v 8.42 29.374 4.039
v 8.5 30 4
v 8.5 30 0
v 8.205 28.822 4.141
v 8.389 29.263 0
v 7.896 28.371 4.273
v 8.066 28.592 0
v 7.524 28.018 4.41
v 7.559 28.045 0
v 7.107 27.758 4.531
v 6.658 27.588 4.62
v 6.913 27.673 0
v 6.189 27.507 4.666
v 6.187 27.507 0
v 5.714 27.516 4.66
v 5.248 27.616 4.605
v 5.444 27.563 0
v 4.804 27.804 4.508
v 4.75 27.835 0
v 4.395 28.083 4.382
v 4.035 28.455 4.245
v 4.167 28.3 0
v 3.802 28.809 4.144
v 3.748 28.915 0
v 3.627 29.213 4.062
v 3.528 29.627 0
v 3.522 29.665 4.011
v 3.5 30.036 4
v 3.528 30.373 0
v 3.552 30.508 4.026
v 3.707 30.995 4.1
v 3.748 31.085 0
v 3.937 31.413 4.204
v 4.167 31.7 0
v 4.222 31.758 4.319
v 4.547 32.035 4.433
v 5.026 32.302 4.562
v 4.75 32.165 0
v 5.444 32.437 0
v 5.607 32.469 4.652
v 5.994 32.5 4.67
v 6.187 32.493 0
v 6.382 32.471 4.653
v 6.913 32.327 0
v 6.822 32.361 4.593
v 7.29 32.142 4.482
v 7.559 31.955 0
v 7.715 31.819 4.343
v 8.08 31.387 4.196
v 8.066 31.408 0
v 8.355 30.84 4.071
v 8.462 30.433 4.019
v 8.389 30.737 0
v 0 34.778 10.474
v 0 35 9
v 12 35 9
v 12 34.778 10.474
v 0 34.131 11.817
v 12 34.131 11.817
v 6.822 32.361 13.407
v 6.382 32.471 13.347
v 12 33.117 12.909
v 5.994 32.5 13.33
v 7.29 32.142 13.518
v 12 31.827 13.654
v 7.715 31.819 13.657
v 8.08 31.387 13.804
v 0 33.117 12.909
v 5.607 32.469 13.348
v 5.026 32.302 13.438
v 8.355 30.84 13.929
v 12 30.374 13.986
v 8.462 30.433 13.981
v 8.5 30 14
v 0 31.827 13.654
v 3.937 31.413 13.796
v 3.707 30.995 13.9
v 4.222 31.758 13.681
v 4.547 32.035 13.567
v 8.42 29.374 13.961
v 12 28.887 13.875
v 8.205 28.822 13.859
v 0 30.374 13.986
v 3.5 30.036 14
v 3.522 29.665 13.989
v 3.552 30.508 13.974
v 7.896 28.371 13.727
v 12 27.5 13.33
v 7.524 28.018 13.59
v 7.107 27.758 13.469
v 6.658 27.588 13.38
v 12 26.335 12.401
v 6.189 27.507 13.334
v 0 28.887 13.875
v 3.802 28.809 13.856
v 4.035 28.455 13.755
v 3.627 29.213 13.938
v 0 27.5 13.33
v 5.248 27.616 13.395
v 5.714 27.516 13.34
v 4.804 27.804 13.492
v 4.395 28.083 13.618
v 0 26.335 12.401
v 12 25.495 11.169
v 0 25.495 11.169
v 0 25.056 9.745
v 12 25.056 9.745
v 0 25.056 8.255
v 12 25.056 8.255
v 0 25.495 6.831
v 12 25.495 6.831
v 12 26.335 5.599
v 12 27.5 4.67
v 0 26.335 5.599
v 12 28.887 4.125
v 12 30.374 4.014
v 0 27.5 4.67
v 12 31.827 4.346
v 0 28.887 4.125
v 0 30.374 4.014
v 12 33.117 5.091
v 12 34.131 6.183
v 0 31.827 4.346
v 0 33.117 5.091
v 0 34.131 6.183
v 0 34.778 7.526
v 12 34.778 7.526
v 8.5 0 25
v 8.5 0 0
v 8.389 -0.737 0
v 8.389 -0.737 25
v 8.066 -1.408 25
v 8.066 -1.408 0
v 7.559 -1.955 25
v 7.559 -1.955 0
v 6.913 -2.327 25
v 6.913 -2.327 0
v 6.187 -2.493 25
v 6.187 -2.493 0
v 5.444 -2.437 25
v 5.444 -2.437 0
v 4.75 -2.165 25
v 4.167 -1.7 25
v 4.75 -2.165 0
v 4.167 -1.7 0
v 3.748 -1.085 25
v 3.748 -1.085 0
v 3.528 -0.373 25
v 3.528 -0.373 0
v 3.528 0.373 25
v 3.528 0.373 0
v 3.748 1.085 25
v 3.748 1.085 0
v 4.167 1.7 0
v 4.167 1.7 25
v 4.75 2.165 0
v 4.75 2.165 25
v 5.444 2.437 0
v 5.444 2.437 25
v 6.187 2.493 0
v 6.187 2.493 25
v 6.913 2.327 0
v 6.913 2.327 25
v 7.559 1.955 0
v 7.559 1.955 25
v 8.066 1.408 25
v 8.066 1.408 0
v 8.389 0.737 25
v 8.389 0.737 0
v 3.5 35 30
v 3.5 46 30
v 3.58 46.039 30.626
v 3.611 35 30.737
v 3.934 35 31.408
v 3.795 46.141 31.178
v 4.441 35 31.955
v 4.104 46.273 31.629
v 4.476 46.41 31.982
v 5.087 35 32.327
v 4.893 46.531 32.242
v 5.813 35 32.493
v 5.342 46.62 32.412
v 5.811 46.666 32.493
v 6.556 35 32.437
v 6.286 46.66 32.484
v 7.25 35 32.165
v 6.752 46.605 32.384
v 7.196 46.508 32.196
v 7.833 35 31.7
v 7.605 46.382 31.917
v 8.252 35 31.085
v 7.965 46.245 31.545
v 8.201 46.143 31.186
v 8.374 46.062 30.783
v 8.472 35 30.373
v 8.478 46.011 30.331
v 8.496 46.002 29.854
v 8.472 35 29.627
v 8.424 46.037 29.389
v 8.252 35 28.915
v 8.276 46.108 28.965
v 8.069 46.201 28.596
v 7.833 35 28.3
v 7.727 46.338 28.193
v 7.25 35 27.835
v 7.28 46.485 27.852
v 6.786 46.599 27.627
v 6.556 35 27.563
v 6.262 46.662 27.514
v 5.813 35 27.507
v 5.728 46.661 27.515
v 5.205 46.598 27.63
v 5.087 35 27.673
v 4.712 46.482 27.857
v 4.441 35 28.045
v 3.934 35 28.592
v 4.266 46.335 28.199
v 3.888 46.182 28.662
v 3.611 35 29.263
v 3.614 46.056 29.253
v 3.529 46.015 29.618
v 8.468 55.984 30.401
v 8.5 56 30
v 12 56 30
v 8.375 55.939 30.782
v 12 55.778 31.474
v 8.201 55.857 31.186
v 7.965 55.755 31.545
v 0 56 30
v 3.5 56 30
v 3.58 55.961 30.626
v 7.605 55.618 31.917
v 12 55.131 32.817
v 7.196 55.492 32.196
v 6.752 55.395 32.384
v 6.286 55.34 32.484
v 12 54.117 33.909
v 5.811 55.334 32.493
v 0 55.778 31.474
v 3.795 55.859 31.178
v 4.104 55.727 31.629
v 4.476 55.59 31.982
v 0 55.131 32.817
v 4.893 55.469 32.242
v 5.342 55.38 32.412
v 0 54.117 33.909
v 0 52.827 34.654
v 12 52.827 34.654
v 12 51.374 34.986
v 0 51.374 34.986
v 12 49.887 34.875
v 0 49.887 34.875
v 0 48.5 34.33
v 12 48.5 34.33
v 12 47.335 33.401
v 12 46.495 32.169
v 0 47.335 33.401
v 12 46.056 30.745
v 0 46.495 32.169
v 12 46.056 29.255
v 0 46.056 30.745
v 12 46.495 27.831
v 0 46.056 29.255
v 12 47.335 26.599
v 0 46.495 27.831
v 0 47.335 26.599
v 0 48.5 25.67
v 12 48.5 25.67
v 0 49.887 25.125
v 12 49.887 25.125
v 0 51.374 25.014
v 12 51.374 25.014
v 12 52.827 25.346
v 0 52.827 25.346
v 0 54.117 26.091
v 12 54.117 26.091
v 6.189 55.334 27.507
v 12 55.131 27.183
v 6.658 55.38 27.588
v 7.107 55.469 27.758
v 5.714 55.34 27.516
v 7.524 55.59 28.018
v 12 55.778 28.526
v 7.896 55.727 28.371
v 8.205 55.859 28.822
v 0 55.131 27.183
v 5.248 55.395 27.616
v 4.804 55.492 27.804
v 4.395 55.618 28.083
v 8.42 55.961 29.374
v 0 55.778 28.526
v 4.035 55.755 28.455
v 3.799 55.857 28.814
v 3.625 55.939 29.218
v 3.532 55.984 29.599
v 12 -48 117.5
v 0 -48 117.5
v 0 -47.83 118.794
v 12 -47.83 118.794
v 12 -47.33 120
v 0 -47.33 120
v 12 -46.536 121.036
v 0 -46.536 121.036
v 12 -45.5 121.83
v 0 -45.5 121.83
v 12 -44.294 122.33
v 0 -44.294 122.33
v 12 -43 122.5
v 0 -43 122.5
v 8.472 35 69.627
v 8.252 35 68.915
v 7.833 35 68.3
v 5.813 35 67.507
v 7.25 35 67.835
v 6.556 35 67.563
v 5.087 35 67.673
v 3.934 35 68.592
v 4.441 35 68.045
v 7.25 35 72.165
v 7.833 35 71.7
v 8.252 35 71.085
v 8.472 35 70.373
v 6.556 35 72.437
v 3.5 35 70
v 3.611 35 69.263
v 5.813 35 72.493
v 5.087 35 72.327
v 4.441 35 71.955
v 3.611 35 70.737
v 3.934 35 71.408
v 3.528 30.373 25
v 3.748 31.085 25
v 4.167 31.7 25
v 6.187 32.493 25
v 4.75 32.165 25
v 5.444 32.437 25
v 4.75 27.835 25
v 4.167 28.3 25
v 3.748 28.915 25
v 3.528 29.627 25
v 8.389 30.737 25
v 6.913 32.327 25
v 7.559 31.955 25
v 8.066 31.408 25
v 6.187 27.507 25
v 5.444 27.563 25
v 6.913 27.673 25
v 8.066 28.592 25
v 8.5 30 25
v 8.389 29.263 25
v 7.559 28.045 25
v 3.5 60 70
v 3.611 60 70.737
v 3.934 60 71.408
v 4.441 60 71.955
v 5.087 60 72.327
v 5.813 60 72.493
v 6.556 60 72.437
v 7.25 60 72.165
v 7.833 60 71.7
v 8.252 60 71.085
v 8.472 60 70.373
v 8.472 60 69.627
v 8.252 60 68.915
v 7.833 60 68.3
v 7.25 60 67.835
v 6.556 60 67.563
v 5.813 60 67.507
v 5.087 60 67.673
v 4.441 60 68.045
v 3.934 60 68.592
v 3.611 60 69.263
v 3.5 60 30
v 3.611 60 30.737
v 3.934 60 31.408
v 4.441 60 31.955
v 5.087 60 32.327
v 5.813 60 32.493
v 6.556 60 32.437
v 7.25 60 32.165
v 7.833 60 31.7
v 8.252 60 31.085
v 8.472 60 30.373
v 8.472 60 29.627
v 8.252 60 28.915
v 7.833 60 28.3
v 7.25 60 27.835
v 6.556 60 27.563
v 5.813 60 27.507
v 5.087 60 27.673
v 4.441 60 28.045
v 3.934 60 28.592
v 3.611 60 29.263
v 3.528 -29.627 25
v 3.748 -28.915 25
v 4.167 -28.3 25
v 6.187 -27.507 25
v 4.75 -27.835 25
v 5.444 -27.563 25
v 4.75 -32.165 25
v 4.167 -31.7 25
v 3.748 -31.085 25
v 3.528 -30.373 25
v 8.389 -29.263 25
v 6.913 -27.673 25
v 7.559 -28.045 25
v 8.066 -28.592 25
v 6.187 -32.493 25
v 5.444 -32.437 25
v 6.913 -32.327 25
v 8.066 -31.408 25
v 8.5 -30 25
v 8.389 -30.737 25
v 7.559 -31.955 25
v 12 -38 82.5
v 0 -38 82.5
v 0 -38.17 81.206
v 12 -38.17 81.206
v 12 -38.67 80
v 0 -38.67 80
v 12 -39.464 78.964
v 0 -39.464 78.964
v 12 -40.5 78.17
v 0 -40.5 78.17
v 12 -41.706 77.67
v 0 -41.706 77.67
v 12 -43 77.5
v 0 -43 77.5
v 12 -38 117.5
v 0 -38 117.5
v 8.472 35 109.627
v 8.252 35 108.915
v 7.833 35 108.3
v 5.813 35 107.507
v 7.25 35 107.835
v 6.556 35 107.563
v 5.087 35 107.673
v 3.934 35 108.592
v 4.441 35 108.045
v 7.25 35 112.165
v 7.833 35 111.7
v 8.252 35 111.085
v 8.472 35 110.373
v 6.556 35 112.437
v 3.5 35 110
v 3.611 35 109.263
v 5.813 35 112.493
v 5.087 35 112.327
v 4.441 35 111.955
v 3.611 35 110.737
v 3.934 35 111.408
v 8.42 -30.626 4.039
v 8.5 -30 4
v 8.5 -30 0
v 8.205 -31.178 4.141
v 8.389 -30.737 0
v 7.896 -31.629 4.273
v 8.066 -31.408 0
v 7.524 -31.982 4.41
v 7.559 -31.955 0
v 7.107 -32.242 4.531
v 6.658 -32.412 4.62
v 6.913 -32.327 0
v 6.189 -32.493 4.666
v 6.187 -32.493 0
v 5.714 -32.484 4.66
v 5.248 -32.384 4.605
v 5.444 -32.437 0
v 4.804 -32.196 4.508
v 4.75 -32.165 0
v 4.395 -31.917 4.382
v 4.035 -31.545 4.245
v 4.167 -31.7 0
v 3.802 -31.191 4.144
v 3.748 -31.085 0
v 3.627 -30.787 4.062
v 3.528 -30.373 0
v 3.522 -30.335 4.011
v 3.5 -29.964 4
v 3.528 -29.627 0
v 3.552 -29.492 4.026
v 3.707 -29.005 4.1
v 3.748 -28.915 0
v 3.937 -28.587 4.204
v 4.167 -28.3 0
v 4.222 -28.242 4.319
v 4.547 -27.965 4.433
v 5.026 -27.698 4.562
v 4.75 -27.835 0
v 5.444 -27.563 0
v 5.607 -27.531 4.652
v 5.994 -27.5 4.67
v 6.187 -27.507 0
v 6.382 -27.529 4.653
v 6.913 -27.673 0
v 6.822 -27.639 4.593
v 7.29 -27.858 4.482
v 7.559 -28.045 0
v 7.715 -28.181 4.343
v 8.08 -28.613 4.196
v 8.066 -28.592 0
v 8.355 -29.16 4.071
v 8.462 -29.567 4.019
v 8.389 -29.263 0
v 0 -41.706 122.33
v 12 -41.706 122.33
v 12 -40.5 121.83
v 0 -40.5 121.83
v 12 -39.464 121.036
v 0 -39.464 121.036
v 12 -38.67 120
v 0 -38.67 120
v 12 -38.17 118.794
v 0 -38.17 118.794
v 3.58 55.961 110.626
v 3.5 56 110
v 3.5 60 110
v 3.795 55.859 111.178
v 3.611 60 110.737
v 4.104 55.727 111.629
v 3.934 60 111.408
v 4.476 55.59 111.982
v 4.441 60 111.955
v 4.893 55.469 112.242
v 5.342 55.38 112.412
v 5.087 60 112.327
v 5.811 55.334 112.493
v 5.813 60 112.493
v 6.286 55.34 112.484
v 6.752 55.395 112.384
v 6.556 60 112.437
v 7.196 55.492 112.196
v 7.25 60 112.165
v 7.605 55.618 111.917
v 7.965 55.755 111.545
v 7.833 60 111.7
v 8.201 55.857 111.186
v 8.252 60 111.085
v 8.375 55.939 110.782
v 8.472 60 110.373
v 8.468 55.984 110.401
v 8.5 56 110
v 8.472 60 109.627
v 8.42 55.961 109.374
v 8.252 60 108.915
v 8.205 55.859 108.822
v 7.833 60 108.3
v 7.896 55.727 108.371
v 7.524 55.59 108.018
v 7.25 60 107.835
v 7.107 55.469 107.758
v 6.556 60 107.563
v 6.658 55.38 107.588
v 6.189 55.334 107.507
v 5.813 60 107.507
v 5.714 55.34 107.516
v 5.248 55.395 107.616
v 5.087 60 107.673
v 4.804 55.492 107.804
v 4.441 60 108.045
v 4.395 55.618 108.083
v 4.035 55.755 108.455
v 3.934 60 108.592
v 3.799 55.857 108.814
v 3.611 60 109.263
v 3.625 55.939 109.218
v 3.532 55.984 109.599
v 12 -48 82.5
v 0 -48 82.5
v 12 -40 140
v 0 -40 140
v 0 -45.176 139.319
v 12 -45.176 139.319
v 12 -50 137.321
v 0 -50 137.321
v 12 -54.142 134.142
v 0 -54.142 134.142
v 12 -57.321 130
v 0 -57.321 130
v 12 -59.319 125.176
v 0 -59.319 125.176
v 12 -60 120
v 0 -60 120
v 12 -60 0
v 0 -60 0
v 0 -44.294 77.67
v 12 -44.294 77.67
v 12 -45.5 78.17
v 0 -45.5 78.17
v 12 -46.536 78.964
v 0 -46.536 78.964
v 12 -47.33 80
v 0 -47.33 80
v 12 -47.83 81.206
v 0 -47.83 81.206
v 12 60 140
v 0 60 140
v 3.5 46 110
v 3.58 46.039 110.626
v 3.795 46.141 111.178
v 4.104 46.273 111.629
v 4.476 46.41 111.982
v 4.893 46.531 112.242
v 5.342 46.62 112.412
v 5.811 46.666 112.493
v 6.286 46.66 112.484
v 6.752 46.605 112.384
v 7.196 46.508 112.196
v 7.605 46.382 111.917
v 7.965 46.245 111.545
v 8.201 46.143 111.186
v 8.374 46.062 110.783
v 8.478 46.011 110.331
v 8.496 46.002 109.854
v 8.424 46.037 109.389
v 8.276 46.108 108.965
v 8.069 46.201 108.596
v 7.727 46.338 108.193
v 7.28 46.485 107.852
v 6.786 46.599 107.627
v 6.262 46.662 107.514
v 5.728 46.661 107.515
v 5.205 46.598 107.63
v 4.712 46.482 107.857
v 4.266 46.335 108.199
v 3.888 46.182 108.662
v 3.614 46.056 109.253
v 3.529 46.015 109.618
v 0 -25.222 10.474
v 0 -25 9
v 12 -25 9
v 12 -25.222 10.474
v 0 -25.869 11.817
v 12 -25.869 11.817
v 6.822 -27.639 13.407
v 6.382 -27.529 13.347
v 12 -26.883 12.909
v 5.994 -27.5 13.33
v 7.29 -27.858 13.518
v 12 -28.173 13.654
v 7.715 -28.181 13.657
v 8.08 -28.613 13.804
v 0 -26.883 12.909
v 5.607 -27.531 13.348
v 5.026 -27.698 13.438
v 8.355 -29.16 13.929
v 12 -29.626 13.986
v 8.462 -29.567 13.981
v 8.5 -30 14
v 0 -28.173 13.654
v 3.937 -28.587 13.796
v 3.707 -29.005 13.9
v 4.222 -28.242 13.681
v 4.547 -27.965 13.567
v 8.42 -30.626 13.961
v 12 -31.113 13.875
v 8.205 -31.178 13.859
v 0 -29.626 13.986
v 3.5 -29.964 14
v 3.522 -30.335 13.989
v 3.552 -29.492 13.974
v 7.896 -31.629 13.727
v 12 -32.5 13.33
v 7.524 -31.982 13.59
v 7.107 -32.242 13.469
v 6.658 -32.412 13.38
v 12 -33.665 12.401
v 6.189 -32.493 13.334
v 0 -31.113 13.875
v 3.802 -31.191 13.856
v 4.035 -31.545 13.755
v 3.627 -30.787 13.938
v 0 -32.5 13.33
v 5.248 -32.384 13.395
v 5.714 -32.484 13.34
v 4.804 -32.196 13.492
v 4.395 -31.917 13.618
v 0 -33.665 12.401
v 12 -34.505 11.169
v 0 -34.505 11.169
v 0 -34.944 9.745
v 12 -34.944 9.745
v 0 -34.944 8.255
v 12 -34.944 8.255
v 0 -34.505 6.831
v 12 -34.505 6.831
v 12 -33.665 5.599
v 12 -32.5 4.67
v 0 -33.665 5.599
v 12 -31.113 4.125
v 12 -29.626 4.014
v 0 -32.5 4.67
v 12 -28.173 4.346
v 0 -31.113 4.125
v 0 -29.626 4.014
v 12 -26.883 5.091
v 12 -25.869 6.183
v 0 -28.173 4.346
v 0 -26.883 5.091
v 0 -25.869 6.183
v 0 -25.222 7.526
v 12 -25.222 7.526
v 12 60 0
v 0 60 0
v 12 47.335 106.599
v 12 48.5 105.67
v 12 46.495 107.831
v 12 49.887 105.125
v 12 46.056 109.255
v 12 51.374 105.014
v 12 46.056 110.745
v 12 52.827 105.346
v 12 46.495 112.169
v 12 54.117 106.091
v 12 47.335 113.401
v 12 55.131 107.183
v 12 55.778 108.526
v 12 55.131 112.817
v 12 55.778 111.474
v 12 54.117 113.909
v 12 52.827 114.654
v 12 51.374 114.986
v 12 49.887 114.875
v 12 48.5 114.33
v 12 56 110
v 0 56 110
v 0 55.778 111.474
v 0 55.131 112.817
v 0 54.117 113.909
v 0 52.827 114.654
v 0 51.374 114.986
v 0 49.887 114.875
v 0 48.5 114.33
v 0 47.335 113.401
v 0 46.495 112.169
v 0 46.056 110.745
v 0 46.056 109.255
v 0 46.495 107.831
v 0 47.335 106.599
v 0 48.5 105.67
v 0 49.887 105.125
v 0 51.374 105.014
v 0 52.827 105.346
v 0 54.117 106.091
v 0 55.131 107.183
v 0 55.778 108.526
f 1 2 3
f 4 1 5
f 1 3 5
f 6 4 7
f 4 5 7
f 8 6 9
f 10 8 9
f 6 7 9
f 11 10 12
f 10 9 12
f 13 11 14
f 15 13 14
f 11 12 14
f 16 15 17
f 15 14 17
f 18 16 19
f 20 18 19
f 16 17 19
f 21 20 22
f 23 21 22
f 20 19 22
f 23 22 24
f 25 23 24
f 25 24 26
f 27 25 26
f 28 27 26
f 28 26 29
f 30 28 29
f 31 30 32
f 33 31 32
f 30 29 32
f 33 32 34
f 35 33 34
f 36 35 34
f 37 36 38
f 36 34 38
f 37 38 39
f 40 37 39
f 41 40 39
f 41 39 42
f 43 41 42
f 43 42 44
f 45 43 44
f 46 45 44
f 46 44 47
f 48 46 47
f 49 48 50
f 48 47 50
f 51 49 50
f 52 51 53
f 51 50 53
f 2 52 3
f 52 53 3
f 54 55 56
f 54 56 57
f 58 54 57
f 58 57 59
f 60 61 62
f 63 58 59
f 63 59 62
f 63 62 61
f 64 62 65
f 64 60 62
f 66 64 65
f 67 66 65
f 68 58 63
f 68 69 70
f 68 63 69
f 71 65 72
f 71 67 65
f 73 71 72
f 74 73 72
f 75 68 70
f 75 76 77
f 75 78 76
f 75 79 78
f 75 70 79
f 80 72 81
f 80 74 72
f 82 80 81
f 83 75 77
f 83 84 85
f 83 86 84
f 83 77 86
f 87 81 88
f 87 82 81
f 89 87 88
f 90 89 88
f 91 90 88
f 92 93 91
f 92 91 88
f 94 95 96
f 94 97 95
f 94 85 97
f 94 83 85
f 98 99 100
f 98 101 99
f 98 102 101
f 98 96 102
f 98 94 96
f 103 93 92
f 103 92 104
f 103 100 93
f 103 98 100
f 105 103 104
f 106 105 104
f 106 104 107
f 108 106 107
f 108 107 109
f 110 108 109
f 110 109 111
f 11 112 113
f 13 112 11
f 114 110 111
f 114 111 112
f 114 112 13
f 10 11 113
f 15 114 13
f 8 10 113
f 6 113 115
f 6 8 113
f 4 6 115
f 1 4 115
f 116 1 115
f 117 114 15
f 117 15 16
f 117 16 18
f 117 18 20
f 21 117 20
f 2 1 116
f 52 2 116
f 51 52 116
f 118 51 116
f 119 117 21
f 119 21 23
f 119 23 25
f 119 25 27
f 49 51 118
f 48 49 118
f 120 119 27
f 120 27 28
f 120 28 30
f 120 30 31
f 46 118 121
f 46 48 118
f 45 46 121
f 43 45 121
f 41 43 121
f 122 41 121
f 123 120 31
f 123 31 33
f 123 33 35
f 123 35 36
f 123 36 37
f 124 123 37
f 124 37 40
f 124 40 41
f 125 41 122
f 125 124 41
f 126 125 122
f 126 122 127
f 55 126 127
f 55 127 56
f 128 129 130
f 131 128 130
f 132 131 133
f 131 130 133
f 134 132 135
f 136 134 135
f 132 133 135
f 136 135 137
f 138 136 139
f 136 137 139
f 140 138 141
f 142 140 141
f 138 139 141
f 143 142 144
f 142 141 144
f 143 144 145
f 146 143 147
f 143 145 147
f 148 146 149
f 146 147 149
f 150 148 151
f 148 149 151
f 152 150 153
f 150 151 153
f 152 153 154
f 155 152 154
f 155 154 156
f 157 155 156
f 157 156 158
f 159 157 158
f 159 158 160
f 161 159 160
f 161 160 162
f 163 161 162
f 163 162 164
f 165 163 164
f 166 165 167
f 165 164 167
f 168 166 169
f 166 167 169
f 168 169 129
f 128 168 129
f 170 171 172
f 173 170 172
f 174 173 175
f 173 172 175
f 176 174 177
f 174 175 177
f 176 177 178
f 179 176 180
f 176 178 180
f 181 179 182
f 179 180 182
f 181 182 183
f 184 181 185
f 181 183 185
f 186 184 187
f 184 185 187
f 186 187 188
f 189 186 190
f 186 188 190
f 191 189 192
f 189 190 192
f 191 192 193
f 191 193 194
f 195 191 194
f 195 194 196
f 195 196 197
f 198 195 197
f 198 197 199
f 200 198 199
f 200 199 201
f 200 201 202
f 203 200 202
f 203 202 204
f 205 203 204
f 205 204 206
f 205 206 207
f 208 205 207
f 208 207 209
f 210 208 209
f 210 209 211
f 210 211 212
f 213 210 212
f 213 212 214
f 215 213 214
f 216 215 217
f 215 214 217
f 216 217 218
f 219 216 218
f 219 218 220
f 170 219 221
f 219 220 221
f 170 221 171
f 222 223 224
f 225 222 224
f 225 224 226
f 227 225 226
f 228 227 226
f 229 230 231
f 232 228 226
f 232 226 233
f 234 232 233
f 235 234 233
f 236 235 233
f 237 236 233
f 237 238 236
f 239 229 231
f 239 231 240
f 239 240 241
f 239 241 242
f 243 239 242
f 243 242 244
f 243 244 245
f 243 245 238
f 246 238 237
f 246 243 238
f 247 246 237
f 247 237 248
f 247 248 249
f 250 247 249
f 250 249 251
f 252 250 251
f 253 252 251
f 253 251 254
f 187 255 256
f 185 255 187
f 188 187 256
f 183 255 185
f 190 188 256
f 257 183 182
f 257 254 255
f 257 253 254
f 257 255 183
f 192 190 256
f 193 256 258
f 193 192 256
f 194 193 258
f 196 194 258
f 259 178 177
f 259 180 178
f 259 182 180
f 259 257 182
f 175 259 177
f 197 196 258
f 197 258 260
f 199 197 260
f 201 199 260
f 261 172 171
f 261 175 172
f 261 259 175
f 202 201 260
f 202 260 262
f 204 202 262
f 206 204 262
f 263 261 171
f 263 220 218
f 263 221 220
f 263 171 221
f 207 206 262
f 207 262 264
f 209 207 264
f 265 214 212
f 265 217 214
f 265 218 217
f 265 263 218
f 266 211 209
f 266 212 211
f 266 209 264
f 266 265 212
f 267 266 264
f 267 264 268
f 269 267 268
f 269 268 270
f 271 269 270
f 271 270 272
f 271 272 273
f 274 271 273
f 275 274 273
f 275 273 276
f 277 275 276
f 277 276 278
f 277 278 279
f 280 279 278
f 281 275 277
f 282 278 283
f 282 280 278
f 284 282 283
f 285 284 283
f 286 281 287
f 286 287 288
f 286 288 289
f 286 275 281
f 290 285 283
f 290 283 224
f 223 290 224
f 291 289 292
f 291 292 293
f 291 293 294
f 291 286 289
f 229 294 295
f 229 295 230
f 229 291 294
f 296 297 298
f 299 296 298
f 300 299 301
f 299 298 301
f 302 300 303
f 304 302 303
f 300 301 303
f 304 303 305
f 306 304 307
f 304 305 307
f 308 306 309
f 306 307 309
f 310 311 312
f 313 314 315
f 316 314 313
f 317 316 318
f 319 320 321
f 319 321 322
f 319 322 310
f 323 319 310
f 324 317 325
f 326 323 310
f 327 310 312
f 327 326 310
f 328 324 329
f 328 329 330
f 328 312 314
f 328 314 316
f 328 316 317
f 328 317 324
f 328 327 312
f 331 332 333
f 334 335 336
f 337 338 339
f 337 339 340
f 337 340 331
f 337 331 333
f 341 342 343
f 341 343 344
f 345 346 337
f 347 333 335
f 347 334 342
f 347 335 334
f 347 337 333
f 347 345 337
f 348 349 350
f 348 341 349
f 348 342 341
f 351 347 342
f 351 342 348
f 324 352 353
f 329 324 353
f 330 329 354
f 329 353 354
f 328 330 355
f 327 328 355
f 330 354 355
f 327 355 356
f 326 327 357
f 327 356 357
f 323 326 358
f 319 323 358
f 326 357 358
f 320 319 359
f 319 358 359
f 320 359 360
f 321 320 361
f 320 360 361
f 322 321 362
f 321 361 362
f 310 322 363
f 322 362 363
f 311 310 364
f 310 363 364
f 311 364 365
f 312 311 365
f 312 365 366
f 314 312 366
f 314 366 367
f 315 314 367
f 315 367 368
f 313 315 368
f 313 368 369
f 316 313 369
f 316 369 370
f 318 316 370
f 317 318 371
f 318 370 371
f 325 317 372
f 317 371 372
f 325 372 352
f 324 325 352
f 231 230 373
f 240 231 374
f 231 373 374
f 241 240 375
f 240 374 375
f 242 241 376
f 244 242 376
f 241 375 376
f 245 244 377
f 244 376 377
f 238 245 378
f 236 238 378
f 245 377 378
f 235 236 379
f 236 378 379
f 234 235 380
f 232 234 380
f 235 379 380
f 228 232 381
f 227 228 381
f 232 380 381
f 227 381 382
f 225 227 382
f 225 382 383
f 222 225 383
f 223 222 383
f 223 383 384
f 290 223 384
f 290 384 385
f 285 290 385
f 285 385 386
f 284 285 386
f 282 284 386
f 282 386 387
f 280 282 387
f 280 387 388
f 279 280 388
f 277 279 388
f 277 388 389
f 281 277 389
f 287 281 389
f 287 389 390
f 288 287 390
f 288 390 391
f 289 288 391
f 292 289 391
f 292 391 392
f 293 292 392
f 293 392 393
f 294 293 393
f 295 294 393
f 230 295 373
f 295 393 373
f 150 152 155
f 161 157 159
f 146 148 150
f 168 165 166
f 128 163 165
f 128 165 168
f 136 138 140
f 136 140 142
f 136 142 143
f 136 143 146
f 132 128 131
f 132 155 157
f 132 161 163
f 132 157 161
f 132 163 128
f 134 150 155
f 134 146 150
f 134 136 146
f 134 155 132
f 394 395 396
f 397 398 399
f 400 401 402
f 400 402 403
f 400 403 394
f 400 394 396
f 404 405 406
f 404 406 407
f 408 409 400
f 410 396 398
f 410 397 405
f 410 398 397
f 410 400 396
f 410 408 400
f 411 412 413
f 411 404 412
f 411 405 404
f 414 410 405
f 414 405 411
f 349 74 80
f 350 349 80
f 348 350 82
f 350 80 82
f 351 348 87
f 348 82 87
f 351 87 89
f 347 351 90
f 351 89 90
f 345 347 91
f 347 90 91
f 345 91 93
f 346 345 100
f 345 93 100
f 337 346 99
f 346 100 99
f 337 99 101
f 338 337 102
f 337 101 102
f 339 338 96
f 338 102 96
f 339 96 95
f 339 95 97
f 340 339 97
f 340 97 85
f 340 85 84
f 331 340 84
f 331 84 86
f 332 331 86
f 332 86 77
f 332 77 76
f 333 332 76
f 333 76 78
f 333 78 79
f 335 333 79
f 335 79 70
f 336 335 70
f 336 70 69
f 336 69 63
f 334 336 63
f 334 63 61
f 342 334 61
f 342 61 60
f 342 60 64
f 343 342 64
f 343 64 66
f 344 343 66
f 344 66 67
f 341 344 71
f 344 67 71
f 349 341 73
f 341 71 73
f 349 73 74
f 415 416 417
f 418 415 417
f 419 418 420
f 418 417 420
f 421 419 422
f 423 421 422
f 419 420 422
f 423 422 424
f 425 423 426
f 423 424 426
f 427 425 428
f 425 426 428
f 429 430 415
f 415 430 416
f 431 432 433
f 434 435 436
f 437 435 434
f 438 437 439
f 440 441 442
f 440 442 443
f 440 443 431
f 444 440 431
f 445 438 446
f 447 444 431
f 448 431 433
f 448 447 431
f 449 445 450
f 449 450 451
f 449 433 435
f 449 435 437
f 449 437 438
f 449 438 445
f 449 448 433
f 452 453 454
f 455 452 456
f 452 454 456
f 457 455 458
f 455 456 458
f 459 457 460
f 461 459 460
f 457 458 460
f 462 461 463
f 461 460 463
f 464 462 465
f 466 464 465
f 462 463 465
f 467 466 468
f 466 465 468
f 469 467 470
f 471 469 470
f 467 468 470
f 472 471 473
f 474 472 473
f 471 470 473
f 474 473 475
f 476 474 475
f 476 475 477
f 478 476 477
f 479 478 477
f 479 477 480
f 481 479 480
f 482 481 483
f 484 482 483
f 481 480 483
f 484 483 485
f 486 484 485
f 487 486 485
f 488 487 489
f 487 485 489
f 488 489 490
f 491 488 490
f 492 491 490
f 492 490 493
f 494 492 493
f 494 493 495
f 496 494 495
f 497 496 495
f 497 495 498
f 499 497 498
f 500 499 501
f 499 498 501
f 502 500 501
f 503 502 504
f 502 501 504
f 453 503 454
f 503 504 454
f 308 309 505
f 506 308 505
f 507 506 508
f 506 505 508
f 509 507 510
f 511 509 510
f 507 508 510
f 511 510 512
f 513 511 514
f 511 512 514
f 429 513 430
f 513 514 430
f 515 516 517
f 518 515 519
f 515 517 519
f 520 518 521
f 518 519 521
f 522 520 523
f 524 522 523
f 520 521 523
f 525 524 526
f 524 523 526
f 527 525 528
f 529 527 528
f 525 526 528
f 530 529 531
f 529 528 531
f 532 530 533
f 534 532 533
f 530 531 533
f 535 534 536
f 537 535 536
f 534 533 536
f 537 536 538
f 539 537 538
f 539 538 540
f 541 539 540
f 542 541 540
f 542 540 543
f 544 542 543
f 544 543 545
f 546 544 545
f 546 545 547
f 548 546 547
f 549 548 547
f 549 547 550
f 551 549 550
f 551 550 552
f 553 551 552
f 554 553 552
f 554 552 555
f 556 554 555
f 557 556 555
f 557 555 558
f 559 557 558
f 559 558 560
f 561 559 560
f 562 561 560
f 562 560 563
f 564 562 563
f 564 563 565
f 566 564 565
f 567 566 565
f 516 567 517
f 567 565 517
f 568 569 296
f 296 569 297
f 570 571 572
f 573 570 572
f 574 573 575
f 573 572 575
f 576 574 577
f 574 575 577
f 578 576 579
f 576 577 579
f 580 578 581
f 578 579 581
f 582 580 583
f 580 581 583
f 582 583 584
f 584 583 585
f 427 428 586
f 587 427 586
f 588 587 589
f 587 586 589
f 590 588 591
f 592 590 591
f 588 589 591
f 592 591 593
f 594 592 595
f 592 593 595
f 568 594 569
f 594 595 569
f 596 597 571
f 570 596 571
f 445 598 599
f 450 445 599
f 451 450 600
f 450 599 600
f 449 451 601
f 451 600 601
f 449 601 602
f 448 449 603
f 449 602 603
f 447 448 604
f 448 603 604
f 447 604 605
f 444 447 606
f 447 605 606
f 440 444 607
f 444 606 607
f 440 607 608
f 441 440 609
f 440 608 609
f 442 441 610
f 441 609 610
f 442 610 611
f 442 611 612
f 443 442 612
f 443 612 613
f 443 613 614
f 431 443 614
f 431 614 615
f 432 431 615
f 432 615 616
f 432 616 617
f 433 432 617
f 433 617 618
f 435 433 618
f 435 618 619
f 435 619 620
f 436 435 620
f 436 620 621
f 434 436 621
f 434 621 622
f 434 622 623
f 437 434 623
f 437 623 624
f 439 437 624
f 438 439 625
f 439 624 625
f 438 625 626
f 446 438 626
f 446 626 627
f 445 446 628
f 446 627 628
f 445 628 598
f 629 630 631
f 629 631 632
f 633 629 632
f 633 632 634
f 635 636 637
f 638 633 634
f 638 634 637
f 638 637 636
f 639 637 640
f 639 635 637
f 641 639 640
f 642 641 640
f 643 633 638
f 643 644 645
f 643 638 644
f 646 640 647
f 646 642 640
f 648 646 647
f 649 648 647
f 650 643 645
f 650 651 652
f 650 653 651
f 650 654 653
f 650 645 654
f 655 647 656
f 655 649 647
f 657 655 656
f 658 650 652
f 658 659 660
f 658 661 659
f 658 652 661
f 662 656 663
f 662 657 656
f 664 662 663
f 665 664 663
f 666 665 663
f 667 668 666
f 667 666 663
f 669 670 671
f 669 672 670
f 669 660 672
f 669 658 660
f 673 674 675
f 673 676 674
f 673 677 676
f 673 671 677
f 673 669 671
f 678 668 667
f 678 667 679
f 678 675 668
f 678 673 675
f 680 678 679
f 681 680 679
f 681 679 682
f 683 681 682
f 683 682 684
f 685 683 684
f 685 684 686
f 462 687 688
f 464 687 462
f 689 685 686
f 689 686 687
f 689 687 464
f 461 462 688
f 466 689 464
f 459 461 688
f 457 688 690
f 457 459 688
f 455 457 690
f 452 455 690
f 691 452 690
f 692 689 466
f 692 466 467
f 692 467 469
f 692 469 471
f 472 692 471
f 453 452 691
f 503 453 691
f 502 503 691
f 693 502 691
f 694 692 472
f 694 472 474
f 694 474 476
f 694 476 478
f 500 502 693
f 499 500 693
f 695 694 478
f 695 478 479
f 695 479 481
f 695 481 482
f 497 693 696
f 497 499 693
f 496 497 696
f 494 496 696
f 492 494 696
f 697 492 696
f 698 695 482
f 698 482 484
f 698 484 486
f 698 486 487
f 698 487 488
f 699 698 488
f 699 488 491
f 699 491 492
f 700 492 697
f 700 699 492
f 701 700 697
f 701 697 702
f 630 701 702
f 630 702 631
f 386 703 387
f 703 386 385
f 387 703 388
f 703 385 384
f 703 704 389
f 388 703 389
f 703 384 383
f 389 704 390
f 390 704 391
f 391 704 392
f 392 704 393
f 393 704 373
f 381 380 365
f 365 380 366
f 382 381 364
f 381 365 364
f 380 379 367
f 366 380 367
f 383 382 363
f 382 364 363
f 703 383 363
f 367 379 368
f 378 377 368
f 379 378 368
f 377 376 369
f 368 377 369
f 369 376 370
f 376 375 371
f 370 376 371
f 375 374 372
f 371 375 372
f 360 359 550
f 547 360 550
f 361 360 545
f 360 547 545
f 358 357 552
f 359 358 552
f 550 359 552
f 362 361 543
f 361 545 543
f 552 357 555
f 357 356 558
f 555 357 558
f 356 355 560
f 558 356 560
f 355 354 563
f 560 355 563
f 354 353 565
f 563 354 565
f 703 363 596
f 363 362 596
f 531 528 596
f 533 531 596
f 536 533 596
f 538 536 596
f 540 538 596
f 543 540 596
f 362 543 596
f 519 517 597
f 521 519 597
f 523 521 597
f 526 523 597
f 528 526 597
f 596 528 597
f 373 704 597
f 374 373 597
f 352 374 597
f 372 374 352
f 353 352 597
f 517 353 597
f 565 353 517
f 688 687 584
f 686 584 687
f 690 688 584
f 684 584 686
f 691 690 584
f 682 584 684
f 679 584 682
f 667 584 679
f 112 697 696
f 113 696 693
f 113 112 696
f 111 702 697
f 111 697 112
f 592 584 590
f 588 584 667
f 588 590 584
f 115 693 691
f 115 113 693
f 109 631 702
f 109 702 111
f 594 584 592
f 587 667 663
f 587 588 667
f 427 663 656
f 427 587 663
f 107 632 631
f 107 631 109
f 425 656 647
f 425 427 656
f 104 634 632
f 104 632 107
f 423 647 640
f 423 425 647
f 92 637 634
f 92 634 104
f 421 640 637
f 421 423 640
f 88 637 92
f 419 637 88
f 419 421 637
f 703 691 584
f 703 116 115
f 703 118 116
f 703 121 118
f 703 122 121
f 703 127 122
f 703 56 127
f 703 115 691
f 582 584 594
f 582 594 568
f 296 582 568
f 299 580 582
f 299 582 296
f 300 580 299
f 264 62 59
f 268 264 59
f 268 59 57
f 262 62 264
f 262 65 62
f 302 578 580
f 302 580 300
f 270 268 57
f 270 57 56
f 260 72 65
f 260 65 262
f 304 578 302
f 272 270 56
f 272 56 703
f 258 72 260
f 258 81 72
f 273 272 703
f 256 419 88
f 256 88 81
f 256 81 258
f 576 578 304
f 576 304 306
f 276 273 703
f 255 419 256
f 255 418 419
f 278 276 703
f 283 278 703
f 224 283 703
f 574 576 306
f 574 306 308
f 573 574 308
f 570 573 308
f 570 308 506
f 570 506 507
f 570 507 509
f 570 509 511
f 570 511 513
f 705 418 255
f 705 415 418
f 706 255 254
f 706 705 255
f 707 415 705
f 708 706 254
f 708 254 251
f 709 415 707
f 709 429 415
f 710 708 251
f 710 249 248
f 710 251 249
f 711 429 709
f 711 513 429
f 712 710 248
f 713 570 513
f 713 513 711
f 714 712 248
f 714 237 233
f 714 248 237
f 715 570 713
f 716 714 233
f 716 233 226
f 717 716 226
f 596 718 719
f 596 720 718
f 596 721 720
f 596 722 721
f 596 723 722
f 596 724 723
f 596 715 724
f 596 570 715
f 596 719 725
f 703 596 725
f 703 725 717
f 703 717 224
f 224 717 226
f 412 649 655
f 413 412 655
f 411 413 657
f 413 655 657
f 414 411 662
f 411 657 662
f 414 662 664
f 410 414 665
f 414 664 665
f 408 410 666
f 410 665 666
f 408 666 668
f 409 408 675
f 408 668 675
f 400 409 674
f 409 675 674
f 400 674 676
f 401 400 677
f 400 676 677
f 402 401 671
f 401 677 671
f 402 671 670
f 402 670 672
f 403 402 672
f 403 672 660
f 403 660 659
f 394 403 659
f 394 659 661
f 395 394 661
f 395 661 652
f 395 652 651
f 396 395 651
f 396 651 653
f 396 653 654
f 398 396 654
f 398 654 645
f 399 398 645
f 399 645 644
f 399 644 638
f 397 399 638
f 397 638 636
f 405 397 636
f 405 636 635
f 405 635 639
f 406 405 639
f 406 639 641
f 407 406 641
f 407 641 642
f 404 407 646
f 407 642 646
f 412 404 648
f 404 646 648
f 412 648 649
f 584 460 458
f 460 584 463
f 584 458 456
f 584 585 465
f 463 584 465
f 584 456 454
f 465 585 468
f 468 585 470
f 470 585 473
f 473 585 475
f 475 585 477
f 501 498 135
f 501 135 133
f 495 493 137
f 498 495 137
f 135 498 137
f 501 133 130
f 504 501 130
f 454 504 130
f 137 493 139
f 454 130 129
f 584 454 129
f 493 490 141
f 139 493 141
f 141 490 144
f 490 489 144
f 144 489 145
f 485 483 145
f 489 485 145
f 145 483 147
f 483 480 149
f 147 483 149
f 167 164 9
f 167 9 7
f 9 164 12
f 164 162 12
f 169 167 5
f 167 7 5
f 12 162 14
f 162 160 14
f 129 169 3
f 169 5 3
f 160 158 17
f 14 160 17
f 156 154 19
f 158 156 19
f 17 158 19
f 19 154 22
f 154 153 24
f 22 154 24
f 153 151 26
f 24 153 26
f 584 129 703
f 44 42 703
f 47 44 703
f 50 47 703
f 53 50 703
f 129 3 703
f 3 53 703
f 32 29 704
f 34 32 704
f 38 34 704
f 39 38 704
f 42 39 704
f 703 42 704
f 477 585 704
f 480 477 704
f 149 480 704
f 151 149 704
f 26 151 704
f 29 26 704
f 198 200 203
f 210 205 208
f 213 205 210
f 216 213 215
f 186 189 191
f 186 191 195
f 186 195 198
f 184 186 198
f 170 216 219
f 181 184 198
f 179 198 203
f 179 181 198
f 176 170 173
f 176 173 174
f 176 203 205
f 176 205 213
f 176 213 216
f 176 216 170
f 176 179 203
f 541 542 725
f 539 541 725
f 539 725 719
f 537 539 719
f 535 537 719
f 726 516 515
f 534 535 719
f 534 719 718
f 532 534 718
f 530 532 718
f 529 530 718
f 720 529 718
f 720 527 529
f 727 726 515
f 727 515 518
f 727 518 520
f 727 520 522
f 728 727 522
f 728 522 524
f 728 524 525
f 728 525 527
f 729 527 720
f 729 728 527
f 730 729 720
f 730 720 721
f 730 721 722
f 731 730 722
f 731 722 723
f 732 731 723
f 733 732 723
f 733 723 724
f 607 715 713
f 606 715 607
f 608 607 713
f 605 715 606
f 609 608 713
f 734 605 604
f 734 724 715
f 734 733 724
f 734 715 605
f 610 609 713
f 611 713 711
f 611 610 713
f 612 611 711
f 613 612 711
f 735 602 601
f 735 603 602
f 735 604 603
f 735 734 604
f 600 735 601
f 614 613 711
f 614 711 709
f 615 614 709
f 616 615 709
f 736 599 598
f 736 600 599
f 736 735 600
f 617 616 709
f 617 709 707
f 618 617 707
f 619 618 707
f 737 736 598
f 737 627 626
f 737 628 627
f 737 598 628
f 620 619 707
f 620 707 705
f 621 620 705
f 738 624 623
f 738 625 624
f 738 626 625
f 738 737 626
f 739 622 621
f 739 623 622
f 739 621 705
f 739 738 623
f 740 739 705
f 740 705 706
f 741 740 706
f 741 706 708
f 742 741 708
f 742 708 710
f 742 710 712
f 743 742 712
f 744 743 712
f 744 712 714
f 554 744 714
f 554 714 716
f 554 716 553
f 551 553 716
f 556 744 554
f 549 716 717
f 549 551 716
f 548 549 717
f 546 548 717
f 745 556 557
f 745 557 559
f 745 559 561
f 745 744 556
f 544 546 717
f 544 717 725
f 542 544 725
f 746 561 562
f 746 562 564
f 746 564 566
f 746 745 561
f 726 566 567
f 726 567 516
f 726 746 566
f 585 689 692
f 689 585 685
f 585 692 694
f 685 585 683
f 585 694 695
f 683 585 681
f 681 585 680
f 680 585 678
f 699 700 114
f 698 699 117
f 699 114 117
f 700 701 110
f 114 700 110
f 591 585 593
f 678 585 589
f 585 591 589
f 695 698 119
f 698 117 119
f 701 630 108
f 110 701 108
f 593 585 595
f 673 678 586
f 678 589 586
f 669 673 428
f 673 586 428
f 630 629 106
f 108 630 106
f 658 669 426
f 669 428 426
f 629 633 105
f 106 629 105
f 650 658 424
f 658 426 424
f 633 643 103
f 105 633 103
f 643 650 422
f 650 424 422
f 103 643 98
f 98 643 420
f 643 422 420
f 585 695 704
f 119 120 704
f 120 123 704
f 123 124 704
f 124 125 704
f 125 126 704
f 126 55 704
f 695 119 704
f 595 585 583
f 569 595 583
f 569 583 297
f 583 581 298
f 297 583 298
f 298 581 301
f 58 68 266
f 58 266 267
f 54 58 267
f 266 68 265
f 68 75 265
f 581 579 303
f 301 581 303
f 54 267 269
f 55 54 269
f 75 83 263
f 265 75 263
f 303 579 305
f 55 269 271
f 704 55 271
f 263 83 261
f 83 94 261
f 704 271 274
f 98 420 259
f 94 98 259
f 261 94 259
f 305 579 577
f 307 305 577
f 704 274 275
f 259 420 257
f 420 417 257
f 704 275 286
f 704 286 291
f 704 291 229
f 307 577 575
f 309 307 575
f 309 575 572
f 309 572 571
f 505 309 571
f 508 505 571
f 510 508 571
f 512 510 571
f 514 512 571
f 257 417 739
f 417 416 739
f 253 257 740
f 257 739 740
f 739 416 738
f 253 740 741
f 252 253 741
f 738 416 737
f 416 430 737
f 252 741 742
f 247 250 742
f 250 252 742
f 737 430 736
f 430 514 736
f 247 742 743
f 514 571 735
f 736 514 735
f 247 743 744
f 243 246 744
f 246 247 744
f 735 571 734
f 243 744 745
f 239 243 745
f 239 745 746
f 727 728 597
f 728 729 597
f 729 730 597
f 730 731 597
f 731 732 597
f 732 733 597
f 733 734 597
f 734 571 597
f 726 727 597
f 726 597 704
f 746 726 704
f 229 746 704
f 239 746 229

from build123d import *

# Parameters (mm, degrees)
F0_R     = 5
F1_DEPTH = 12
F2_R     = 2.5
F3_DEPTH = 25
F4_R     = 2.5
F5_DEPTH = 25


with BuildPart() as f1:
    # F0 (on Right) → F1 (new body)
    with BuildSketch(Plane.YZ):
        with BuildLine():
            Line((-60, 120), (-60, 0))
            Line((-60, 0), (60, 0))
            Line((60, 0), (60, 140))
            Line((60, 140), (-40, 140))
            ThreePointArc((-40, 140), (-54.142136, 134.142136), (-60, 120))
        make_face()
        with Locations((-30, 9)):
            Circle(F0_R, mode=Mode.SUBTRACT)
        with Locations((30, 9)):
            Circle(F0_R, mode=Mode.SUBTRACT)
        with Locations((51, 30)):
            Circle(F0_R, mode=Mode.SUBTRACT)
        with BuildLine():
            Line((-48, 82.5), (-48, 117.5))
            ThreePointArc((-48, 117.5), (-46.535534, 121.035534), (-43, 122.5))
            ThreePointArc((-43, 122.5), (-39.464466, 121.035534), (-38, 117.5))
            Line((-38, 117.5), (-38, 82.5))
            ThreePointArc((-38, 82.5), (-39.464466, 78.964466), (-43, 77.5))
            ThreePointArc((-43, 77.5), (-46.535534, 78.964466), (-48, 82.5))
        make_face(mode=Mode.SUBTRACT)
        with Locations((51, 110)):
            Circle(F0_R, mode=Mode.SUBTRACT)
    extrude(amount=F1_DEPTH)

    # F2 (on face) → F3 (cut)
    with BuildSketch(Plane(origin=(0, 0, 0), x_dir=(1, 0, 0), z_dir=(0, 0, -1))):
        with Locations((6, 0)):
            Circle(F2_R)
        with Locations((6, 30)):
            Circle(F2_R)
        with Locations((6, -30)):
            Circle(F2_R)
    extrude(amount=-F3_DEPTH, mode=Mode.SUBTRACT)

    # F4 (on face) → F5 (cut)
    with BuildSketch(Plane(origin=(0, 60, 0), x_dir=(-1, 0, 0), z_dir=(0, 1, 0))):
        with Locations((-6, 70)):
            Circle(F4_R)
        with Locations((-6, 110)):
            Circle(F4_R)
        with Locations((-6, 30)):
            Circle(F4_R)
    extrude(amount=-F5_DEPTH, mode=Mode.SUBTRACT)


solid = f1.part
